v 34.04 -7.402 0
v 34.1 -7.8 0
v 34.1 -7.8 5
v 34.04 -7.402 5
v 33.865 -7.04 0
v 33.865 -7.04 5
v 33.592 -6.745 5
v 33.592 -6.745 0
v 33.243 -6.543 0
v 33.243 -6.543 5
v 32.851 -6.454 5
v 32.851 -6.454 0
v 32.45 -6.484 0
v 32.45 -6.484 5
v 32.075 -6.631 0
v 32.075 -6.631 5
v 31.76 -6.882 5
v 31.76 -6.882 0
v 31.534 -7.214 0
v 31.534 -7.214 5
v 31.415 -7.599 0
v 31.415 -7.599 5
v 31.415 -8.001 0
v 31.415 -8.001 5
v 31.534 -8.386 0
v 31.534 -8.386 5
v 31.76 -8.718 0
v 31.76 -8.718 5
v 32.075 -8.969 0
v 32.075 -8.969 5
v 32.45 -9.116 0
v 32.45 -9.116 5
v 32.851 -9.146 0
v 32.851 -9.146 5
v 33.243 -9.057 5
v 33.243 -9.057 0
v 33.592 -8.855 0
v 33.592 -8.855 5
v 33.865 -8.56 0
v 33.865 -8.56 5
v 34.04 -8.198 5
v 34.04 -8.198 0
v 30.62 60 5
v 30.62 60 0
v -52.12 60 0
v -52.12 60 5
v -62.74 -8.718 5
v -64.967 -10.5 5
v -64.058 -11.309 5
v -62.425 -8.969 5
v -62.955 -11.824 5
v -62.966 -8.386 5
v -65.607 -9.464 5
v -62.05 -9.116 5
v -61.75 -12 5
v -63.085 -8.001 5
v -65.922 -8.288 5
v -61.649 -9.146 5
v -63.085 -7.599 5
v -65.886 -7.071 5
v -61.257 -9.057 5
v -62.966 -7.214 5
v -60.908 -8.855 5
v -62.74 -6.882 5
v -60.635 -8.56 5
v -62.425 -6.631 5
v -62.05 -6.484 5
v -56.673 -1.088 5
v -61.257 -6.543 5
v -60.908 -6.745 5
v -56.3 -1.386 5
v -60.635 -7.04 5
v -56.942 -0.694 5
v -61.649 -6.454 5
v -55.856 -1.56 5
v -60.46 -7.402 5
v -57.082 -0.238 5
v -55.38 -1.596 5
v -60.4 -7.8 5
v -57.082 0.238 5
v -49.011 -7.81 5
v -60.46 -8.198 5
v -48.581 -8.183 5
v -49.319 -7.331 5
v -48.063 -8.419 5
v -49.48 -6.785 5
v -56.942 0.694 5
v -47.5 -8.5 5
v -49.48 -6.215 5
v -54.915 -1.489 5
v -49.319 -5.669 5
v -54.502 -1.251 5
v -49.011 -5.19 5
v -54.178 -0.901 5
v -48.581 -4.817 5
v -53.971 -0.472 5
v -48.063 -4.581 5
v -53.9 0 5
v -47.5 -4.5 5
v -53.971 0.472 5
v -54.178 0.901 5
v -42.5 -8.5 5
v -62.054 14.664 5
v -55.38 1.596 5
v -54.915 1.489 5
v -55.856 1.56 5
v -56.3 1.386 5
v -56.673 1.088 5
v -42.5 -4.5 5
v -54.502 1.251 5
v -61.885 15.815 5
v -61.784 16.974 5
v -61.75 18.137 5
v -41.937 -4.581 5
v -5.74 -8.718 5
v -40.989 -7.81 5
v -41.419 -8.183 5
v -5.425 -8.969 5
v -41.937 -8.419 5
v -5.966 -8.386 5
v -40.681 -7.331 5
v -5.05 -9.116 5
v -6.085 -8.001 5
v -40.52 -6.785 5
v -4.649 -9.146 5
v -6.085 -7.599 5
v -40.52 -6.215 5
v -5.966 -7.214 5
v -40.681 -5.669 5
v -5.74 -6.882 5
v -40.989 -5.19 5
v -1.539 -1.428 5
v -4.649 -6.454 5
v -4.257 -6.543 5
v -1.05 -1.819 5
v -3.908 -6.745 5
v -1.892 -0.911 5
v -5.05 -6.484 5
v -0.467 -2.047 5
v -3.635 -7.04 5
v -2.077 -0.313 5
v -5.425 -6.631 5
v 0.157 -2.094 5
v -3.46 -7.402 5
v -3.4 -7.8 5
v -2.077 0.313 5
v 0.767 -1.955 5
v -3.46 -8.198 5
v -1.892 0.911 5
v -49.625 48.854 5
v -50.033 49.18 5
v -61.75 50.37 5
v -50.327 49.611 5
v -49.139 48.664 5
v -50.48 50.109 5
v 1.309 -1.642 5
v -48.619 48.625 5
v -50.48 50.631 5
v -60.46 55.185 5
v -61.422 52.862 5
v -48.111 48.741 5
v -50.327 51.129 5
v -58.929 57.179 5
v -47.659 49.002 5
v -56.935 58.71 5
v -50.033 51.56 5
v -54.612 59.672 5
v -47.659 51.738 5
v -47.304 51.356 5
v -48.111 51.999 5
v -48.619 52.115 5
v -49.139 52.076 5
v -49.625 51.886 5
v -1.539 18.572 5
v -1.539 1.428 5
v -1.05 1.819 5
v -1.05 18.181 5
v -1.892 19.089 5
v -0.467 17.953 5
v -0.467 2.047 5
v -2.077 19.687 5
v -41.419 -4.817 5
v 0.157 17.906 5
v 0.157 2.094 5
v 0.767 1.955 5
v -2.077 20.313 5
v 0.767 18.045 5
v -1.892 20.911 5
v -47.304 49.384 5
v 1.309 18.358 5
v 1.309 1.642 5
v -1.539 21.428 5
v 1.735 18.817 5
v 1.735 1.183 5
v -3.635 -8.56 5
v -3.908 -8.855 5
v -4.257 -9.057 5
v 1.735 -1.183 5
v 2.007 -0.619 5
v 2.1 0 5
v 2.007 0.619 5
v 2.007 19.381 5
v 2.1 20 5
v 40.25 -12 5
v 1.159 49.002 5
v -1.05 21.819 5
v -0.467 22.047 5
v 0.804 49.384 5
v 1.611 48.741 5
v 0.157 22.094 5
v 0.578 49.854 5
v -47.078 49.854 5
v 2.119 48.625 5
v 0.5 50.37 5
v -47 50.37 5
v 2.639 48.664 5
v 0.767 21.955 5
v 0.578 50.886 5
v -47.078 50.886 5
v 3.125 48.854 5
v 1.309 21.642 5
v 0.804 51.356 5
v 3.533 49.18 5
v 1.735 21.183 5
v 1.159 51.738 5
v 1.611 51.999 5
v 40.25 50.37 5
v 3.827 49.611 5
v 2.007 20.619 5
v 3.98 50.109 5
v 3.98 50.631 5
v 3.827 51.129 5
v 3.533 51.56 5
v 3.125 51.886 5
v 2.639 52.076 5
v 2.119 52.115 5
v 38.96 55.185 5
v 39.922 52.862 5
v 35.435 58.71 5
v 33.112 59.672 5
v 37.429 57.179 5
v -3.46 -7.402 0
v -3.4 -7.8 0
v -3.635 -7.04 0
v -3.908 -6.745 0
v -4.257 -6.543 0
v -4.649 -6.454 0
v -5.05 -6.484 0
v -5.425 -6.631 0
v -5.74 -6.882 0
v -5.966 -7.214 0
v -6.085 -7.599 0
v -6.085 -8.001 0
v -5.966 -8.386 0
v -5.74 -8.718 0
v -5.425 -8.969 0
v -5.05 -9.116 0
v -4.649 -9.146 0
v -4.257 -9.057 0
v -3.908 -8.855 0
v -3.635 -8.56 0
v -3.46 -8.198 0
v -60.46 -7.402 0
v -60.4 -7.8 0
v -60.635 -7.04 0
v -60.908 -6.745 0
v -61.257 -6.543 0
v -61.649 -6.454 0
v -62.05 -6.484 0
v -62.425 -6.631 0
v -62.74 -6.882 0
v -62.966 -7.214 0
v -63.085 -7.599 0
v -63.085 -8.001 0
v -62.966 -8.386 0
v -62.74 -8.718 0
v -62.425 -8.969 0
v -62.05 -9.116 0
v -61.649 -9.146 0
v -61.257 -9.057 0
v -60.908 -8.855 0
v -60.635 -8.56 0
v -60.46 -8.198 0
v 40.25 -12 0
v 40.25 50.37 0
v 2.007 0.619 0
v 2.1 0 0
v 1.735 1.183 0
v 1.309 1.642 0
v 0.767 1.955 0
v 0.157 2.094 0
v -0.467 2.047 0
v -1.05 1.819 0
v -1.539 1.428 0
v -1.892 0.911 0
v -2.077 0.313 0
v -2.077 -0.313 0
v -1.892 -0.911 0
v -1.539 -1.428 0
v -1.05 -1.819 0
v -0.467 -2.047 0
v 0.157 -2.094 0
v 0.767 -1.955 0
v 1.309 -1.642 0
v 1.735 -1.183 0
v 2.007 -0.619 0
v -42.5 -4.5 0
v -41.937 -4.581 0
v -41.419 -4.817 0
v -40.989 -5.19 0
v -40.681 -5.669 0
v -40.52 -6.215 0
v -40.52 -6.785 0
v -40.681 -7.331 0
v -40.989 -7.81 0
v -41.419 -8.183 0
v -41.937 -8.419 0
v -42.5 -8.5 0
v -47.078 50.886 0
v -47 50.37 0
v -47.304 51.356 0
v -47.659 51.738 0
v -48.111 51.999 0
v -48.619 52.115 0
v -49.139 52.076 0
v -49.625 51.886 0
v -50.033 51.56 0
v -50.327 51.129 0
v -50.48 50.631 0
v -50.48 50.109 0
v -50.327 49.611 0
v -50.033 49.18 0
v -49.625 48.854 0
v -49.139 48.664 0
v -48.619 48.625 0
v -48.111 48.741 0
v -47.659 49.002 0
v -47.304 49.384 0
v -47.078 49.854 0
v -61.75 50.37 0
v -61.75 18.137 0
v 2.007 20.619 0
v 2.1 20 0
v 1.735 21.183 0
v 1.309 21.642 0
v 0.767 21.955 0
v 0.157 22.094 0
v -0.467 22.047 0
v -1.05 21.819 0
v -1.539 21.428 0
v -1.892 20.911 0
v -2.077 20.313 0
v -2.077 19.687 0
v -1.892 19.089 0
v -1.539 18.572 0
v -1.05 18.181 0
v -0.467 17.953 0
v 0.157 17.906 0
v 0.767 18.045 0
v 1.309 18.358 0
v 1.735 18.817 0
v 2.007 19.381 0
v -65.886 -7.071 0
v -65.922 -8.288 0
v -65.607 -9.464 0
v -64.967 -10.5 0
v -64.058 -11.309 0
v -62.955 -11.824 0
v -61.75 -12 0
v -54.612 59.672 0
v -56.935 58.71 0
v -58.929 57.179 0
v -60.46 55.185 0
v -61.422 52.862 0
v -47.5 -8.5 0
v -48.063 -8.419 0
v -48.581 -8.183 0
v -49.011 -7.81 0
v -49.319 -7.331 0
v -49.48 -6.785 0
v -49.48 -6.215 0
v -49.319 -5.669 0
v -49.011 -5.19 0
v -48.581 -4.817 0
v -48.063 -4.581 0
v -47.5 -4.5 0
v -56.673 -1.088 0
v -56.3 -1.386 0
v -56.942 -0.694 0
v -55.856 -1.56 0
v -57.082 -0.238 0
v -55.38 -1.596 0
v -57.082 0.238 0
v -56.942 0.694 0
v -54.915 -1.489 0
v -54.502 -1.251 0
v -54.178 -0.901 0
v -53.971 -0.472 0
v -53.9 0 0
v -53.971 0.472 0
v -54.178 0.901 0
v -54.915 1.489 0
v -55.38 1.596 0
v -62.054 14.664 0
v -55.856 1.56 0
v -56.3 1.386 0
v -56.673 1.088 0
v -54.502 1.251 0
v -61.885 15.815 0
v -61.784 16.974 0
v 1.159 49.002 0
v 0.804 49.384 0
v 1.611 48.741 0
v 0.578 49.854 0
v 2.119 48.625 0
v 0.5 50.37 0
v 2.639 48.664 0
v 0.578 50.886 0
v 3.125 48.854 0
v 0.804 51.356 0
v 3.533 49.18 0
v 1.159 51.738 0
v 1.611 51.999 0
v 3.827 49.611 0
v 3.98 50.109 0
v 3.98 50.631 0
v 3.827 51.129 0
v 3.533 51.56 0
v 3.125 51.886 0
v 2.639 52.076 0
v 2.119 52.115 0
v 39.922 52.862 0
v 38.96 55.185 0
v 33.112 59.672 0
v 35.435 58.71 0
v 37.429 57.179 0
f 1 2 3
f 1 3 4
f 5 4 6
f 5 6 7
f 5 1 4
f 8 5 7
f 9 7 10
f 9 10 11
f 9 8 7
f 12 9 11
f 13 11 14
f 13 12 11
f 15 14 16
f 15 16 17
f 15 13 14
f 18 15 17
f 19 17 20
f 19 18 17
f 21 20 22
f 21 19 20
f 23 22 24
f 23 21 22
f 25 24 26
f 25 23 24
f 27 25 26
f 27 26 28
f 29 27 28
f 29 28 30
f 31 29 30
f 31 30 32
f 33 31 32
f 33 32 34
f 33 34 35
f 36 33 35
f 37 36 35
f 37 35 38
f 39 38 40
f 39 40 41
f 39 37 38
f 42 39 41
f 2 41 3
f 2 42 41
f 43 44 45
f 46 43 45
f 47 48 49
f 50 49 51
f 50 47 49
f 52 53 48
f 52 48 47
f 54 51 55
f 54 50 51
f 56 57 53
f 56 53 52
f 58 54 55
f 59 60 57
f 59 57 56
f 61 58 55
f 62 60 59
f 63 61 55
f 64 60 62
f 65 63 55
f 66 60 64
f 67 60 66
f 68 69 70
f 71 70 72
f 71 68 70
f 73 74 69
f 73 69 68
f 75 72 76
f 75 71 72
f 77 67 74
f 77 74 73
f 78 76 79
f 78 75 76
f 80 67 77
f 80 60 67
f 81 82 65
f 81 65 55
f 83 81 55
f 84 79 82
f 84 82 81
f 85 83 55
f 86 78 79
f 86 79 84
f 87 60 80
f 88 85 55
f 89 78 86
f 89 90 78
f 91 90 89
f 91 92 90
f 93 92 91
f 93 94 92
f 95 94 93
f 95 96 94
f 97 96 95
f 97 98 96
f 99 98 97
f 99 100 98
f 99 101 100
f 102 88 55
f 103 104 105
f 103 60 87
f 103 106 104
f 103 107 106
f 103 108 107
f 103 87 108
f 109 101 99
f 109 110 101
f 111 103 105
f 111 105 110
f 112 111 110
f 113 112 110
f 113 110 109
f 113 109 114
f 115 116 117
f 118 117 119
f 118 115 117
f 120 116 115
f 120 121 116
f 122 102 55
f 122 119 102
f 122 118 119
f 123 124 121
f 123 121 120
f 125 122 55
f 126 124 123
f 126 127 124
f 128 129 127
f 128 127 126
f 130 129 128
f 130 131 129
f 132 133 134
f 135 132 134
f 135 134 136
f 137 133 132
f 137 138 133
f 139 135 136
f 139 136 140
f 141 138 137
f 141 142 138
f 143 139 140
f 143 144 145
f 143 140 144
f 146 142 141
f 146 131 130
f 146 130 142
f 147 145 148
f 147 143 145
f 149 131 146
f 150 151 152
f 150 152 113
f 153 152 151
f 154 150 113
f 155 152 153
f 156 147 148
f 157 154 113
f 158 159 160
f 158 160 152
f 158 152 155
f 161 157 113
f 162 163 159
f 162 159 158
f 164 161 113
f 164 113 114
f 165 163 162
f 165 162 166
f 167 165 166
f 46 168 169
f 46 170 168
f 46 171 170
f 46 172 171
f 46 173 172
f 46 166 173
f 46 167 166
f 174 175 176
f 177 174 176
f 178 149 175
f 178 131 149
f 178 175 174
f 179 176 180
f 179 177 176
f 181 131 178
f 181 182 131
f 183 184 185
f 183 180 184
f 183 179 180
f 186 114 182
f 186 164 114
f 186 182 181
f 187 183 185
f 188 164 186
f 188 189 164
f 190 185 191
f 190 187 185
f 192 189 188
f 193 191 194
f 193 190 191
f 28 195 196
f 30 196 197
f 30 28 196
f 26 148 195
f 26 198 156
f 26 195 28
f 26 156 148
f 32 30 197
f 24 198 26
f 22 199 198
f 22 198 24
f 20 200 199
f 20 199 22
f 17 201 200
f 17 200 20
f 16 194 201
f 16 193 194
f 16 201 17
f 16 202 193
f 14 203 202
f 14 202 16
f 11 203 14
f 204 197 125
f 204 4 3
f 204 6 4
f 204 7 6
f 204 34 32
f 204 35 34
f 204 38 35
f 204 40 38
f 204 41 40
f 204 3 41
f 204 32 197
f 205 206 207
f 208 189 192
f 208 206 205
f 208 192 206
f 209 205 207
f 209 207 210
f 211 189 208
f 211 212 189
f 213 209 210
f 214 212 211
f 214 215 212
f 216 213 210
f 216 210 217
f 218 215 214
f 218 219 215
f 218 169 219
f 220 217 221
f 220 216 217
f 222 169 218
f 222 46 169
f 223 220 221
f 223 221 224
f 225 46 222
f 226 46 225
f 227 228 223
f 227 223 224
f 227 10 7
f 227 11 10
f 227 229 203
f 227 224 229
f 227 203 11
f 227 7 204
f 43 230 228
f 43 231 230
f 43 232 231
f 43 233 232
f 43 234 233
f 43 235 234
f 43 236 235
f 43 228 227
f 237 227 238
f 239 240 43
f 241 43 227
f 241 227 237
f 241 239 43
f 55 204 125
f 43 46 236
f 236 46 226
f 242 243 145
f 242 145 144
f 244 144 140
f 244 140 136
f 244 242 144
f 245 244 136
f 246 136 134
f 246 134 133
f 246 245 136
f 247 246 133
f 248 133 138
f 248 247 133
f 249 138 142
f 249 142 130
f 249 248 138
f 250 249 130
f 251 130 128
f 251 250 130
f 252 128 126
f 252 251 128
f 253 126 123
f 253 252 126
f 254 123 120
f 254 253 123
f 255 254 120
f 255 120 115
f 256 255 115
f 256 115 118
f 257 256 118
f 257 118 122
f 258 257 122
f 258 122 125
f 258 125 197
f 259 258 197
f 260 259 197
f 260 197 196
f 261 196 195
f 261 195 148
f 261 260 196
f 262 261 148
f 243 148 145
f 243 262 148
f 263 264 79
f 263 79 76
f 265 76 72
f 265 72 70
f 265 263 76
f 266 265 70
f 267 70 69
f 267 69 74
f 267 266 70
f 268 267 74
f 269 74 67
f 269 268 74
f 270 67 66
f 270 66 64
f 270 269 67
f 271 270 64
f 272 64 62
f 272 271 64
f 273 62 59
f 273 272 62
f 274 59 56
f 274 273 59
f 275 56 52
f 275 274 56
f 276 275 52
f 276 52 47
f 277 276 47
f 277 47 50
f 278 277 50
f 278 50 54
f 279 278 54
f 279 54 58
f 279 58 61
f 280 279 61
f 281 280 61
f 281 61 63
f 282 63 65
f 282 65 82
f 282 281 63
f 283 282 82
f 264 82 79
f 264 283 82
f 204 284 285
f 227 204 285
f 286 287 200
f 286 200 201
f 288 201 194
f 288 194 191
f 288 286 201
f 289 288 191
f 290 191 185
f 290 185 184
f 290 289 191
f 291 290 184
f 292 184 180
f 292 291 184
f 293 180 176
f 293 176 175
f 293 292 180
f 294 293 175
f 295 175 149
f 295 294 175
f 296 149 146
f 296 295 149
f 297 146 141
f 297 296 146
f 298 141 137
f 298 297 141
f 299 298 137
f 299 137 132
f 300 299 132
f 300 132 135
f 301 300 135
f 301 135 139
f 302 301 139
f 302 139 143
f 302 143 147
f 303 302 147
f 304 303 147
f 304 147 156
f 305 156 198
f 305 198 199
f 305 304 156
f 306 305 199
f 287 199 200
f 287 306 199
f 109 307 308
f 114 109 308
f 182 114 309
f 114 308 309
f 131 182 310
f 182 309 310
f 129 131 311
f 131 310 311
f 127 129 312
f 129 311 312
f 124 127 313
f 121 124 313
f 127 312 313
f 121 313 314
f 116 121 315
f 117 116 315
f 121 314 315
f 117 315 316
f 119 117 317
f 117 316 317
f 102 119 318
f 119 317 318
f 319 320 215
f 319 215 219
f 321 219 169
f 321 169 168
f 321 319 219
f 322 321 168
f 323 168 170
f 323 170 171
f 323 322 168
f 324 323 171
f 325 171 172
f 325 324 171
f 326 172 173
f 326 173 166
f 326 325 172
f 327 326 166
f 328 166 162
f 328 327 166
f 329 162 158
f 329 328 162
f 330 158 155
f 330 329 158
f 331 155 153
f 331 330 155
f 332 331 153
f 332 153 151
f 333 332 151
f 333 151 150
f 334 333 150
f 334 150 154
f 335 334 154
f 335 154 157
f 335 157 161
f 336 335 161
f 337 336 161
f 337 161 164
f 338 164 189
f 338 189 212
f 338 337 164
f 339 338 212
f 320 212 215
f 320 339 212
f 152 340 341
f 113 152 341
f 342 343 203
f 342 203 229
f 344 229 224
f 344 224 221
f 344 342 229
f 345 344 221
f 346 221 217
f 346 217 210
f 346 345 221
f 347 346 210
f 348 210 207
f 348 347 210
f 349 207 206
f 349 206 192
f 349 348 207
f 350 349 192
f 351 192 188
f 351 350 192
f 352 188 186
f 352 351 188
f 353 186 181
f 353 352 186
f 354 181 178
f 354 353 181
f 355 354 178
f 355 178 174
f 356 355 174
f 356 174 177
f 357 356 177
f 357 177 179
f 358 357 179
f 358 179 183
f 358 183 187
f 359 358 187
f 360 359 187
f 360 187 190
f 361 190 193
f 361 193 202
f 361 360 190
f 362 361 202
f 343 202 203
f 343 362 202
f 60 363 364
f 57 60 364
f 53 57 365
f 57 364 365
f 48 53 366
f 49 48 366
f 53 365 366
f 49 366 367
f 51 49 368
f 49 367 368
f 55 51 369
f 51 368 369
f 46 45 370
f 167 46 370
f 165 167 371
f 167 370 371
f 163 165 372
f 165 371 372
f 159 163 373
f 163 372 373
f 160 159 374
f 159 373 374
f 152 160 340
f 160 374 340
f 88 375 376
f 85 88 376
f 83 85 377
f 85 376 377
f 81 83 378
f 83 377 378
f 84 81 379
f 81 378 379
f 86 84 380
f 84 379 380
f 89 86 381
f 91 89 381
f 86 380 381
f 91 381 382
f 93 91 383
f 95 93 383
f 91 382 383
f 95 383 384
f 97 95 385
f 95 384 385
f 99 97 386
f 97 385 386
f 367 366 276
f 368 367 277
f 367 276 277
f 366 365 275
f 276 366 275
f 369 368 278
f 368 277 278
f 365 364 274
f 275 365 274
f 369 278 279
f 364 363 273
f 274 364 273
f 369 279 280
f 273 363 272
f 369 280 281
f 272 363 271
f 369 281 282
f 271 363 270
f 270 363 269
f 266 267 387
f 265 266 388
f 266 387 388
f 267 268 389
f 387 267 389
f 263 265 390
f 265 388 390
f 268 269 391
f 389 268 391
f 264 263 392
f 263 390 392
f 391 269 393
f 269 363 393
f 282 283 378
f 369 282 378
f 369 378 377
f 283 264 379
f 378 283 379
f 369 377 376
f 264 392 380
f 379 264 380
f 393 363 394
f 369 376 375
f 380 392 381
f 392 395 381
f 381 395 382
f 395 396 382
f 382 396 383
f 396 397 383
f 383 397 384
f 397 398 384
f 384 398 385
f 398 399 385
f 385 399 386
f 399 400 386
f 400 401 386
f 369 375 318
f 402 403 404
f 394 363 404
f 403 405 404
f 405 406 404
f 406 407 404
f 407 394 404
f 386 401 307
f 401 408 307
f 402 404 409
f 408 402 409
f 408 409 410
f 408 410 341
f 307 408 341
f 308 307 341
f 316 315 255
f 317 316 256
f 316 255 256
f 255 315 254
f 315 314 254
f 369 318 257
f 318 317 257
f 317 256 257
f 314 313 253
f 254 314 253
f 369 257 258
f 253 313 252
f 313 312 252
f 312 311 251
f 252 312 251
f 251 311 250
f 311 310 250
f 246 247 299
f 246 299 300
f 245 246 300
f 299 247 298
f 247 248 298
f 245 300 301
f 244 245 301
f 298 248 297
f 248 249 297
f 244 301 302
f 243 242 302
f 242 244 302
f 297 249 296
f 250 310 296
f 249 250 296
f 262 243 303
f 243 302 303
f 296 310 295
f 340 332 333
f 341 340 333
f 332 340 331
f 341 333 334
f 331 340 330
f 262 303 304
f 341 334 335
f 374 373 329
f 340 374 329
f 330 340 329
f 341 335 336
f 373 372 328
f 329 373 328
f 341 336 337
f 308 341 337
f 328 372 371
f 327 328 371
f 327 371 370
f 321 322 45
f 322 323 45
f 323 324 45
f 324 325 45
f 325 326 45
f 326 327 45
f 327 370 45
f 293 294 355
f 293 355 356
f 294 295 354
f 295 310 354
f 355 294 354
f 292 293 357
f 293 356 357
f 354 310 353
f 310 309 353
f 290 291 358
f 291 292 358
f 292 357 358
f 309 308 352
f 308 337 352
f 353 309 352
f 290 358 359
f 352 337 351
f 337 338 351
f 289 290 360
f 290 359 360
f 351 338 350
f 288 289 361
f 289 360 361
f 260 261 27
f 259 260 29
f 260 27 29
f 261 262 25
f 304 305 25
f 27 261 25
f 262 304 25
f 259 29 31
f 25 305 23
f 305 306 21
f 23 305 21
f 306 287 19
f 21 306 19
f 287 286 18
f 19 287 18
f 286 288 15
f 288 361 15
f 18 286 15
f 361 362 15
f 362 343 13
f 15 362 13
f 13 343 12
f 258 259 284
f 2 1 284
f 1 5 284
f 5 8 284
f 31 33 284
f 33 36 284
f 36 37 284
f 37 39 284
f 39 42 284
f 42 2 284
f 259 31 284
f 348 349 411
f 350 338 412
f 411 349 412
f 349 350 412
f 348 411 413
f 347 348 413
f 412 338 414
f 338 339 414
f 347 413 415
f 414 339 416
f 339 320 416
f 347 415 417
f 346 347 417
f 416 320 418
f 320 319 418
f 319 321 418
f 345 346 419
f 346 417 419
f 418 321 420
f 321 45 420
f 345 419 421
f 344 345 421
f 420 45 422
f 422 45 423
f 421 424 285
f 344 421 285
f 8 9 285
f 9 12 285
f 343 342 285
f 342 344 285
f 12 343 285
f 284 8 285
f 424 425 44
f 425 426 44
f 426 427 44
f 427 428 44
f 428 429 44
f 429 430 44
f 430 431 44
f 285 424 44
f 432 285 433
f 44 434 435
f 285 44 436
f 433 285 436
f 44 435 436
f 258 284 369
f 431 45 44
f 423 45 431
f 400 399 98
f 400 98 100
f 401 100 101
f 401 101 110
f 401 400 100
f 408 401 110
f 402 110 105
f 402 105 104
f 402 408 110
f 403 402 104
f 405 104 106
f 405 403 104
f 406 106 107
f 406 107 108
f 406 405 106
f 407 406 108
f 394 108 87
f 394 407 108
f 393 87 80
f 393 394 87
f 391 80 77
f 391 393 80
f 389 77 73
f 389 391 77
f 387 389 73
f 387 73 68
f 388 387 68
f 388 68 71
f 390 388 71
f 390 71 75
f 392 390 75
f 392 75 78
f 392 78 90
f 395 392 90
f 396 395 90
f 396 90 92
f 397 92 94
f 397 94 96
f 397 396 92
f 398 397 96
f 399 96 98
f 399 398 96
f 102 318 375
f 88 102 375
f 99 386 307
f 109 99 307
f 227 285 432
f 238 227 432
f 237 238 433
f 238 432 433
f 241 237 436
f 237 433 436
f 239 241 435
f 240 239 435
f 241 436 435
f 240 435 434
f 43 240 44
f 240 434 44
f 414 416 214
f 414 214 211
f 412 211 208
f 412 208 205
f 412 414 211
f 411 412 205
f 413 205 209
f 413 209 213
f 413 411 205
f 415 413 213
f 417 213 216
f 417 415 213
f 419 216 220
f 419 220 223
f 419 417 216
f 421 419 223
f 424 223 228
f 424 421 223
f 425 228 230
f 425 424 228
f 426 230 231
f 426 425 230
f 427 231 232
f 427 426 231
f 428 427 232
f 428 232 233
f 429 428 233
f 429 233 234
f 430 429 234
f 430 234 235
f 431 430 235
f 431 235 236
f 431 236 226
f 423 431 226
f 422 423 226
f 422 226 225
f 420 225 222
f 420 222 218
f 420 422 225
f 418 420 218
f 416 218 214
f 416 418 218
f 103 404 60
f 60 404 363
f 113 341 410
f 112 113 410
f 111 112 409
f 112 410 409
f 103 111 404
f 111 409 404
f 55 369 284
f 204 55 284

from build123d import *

# Parameters (mm, degrees)
SKETCH1_R           = 2.1
SKETCH1_R_2         = 1.75
SKETCH1_R_3         = 1.35
SKETCH1_R_4         = 1.6
BOSS_EXTRUDE1_DEPTH = 5


with BuildPart() as part:
    # Sketch1 → Boss-Extrude1 (new body)
    with BuildSketch(Plane.XY):
        with BuildLine():
            Line((-62.05384494, 14.663645746), (-65.886192563, -7.070677654))
            ThreePointArc((-65.886192563, -7.070677654), (-64.967386661, -10.499707961), (-61.75, -12))
            Line((-61.75, -12), (40.25, -12))
            Line((40.25, -12), (40.25, 50.37))
            ThreePointArc((40.25, 50.37), (37.429438303, 57.179438303), (30.62, 60))
            Line((30.62, 60), (-52.12, 60))
            ThreePointArc((-52.12, 60), (-58.929438303, 57.179438303), (-61.75, 50.37))
            Line((-61.75, 50.37), (-61.75, 18.1366093))
            ThreePointArc((-61.75, 18.1366093), (-61.826106038, 16.393494445), (-62.05384494, 14.663645746))
        make_face()
        Circle(SKETCH1_R, mode=Mode.SUBTRACT)
        with Locations((-48.75, 50.37)):
            Circle(SKETCH1_R_2, mode=Mode.SUBTRACT)
        with Locations((32.75, -7.8)):
            Circle(SKETCH1_R_3, mode=Mode.SUBTRACT)
        with Locations(Location((2.25, 50.37, 0), (0, 0, 180))):
            Circle(SKETCH1_R_2, mode=Mode.SUBTRACT)
        with Locations((-61.75, -7.8)):
            Circle(SKETCH1_R_3, mode=Mode.SUBTRACT)
        with Locations((-4.75, -7.8)):
            Circle(SKETCH1_R_3, mode=Mode.SUBTRACT)
        with Locations((0, 20)):
            Circle(SKETCH1_R, mode=Mode.SUBTRACT)
        with Locations((-55.5, 0)):
            Circle(SKETCH1_R_4, mode=Mode.SUBTRACT)
        with BuildLine():
            Line((-47.5, -4.5), (-42.5, -4.5))
            ThreePointArc((-42.5, -4.5), (-40.5, -6.5), (-42.5, -8.5))
            Line((-42.5, -8.5), (-47.5, -8.5))
            ThreePointArc((-47.5, -8.5), (-49.5, -6.5), (-47.5, -4.5))
        make_face(mode=Mode.SUBTRACT)
    extrude(amount=BOSS_EXTRUDE1_DEPTH)


solid = part.part
